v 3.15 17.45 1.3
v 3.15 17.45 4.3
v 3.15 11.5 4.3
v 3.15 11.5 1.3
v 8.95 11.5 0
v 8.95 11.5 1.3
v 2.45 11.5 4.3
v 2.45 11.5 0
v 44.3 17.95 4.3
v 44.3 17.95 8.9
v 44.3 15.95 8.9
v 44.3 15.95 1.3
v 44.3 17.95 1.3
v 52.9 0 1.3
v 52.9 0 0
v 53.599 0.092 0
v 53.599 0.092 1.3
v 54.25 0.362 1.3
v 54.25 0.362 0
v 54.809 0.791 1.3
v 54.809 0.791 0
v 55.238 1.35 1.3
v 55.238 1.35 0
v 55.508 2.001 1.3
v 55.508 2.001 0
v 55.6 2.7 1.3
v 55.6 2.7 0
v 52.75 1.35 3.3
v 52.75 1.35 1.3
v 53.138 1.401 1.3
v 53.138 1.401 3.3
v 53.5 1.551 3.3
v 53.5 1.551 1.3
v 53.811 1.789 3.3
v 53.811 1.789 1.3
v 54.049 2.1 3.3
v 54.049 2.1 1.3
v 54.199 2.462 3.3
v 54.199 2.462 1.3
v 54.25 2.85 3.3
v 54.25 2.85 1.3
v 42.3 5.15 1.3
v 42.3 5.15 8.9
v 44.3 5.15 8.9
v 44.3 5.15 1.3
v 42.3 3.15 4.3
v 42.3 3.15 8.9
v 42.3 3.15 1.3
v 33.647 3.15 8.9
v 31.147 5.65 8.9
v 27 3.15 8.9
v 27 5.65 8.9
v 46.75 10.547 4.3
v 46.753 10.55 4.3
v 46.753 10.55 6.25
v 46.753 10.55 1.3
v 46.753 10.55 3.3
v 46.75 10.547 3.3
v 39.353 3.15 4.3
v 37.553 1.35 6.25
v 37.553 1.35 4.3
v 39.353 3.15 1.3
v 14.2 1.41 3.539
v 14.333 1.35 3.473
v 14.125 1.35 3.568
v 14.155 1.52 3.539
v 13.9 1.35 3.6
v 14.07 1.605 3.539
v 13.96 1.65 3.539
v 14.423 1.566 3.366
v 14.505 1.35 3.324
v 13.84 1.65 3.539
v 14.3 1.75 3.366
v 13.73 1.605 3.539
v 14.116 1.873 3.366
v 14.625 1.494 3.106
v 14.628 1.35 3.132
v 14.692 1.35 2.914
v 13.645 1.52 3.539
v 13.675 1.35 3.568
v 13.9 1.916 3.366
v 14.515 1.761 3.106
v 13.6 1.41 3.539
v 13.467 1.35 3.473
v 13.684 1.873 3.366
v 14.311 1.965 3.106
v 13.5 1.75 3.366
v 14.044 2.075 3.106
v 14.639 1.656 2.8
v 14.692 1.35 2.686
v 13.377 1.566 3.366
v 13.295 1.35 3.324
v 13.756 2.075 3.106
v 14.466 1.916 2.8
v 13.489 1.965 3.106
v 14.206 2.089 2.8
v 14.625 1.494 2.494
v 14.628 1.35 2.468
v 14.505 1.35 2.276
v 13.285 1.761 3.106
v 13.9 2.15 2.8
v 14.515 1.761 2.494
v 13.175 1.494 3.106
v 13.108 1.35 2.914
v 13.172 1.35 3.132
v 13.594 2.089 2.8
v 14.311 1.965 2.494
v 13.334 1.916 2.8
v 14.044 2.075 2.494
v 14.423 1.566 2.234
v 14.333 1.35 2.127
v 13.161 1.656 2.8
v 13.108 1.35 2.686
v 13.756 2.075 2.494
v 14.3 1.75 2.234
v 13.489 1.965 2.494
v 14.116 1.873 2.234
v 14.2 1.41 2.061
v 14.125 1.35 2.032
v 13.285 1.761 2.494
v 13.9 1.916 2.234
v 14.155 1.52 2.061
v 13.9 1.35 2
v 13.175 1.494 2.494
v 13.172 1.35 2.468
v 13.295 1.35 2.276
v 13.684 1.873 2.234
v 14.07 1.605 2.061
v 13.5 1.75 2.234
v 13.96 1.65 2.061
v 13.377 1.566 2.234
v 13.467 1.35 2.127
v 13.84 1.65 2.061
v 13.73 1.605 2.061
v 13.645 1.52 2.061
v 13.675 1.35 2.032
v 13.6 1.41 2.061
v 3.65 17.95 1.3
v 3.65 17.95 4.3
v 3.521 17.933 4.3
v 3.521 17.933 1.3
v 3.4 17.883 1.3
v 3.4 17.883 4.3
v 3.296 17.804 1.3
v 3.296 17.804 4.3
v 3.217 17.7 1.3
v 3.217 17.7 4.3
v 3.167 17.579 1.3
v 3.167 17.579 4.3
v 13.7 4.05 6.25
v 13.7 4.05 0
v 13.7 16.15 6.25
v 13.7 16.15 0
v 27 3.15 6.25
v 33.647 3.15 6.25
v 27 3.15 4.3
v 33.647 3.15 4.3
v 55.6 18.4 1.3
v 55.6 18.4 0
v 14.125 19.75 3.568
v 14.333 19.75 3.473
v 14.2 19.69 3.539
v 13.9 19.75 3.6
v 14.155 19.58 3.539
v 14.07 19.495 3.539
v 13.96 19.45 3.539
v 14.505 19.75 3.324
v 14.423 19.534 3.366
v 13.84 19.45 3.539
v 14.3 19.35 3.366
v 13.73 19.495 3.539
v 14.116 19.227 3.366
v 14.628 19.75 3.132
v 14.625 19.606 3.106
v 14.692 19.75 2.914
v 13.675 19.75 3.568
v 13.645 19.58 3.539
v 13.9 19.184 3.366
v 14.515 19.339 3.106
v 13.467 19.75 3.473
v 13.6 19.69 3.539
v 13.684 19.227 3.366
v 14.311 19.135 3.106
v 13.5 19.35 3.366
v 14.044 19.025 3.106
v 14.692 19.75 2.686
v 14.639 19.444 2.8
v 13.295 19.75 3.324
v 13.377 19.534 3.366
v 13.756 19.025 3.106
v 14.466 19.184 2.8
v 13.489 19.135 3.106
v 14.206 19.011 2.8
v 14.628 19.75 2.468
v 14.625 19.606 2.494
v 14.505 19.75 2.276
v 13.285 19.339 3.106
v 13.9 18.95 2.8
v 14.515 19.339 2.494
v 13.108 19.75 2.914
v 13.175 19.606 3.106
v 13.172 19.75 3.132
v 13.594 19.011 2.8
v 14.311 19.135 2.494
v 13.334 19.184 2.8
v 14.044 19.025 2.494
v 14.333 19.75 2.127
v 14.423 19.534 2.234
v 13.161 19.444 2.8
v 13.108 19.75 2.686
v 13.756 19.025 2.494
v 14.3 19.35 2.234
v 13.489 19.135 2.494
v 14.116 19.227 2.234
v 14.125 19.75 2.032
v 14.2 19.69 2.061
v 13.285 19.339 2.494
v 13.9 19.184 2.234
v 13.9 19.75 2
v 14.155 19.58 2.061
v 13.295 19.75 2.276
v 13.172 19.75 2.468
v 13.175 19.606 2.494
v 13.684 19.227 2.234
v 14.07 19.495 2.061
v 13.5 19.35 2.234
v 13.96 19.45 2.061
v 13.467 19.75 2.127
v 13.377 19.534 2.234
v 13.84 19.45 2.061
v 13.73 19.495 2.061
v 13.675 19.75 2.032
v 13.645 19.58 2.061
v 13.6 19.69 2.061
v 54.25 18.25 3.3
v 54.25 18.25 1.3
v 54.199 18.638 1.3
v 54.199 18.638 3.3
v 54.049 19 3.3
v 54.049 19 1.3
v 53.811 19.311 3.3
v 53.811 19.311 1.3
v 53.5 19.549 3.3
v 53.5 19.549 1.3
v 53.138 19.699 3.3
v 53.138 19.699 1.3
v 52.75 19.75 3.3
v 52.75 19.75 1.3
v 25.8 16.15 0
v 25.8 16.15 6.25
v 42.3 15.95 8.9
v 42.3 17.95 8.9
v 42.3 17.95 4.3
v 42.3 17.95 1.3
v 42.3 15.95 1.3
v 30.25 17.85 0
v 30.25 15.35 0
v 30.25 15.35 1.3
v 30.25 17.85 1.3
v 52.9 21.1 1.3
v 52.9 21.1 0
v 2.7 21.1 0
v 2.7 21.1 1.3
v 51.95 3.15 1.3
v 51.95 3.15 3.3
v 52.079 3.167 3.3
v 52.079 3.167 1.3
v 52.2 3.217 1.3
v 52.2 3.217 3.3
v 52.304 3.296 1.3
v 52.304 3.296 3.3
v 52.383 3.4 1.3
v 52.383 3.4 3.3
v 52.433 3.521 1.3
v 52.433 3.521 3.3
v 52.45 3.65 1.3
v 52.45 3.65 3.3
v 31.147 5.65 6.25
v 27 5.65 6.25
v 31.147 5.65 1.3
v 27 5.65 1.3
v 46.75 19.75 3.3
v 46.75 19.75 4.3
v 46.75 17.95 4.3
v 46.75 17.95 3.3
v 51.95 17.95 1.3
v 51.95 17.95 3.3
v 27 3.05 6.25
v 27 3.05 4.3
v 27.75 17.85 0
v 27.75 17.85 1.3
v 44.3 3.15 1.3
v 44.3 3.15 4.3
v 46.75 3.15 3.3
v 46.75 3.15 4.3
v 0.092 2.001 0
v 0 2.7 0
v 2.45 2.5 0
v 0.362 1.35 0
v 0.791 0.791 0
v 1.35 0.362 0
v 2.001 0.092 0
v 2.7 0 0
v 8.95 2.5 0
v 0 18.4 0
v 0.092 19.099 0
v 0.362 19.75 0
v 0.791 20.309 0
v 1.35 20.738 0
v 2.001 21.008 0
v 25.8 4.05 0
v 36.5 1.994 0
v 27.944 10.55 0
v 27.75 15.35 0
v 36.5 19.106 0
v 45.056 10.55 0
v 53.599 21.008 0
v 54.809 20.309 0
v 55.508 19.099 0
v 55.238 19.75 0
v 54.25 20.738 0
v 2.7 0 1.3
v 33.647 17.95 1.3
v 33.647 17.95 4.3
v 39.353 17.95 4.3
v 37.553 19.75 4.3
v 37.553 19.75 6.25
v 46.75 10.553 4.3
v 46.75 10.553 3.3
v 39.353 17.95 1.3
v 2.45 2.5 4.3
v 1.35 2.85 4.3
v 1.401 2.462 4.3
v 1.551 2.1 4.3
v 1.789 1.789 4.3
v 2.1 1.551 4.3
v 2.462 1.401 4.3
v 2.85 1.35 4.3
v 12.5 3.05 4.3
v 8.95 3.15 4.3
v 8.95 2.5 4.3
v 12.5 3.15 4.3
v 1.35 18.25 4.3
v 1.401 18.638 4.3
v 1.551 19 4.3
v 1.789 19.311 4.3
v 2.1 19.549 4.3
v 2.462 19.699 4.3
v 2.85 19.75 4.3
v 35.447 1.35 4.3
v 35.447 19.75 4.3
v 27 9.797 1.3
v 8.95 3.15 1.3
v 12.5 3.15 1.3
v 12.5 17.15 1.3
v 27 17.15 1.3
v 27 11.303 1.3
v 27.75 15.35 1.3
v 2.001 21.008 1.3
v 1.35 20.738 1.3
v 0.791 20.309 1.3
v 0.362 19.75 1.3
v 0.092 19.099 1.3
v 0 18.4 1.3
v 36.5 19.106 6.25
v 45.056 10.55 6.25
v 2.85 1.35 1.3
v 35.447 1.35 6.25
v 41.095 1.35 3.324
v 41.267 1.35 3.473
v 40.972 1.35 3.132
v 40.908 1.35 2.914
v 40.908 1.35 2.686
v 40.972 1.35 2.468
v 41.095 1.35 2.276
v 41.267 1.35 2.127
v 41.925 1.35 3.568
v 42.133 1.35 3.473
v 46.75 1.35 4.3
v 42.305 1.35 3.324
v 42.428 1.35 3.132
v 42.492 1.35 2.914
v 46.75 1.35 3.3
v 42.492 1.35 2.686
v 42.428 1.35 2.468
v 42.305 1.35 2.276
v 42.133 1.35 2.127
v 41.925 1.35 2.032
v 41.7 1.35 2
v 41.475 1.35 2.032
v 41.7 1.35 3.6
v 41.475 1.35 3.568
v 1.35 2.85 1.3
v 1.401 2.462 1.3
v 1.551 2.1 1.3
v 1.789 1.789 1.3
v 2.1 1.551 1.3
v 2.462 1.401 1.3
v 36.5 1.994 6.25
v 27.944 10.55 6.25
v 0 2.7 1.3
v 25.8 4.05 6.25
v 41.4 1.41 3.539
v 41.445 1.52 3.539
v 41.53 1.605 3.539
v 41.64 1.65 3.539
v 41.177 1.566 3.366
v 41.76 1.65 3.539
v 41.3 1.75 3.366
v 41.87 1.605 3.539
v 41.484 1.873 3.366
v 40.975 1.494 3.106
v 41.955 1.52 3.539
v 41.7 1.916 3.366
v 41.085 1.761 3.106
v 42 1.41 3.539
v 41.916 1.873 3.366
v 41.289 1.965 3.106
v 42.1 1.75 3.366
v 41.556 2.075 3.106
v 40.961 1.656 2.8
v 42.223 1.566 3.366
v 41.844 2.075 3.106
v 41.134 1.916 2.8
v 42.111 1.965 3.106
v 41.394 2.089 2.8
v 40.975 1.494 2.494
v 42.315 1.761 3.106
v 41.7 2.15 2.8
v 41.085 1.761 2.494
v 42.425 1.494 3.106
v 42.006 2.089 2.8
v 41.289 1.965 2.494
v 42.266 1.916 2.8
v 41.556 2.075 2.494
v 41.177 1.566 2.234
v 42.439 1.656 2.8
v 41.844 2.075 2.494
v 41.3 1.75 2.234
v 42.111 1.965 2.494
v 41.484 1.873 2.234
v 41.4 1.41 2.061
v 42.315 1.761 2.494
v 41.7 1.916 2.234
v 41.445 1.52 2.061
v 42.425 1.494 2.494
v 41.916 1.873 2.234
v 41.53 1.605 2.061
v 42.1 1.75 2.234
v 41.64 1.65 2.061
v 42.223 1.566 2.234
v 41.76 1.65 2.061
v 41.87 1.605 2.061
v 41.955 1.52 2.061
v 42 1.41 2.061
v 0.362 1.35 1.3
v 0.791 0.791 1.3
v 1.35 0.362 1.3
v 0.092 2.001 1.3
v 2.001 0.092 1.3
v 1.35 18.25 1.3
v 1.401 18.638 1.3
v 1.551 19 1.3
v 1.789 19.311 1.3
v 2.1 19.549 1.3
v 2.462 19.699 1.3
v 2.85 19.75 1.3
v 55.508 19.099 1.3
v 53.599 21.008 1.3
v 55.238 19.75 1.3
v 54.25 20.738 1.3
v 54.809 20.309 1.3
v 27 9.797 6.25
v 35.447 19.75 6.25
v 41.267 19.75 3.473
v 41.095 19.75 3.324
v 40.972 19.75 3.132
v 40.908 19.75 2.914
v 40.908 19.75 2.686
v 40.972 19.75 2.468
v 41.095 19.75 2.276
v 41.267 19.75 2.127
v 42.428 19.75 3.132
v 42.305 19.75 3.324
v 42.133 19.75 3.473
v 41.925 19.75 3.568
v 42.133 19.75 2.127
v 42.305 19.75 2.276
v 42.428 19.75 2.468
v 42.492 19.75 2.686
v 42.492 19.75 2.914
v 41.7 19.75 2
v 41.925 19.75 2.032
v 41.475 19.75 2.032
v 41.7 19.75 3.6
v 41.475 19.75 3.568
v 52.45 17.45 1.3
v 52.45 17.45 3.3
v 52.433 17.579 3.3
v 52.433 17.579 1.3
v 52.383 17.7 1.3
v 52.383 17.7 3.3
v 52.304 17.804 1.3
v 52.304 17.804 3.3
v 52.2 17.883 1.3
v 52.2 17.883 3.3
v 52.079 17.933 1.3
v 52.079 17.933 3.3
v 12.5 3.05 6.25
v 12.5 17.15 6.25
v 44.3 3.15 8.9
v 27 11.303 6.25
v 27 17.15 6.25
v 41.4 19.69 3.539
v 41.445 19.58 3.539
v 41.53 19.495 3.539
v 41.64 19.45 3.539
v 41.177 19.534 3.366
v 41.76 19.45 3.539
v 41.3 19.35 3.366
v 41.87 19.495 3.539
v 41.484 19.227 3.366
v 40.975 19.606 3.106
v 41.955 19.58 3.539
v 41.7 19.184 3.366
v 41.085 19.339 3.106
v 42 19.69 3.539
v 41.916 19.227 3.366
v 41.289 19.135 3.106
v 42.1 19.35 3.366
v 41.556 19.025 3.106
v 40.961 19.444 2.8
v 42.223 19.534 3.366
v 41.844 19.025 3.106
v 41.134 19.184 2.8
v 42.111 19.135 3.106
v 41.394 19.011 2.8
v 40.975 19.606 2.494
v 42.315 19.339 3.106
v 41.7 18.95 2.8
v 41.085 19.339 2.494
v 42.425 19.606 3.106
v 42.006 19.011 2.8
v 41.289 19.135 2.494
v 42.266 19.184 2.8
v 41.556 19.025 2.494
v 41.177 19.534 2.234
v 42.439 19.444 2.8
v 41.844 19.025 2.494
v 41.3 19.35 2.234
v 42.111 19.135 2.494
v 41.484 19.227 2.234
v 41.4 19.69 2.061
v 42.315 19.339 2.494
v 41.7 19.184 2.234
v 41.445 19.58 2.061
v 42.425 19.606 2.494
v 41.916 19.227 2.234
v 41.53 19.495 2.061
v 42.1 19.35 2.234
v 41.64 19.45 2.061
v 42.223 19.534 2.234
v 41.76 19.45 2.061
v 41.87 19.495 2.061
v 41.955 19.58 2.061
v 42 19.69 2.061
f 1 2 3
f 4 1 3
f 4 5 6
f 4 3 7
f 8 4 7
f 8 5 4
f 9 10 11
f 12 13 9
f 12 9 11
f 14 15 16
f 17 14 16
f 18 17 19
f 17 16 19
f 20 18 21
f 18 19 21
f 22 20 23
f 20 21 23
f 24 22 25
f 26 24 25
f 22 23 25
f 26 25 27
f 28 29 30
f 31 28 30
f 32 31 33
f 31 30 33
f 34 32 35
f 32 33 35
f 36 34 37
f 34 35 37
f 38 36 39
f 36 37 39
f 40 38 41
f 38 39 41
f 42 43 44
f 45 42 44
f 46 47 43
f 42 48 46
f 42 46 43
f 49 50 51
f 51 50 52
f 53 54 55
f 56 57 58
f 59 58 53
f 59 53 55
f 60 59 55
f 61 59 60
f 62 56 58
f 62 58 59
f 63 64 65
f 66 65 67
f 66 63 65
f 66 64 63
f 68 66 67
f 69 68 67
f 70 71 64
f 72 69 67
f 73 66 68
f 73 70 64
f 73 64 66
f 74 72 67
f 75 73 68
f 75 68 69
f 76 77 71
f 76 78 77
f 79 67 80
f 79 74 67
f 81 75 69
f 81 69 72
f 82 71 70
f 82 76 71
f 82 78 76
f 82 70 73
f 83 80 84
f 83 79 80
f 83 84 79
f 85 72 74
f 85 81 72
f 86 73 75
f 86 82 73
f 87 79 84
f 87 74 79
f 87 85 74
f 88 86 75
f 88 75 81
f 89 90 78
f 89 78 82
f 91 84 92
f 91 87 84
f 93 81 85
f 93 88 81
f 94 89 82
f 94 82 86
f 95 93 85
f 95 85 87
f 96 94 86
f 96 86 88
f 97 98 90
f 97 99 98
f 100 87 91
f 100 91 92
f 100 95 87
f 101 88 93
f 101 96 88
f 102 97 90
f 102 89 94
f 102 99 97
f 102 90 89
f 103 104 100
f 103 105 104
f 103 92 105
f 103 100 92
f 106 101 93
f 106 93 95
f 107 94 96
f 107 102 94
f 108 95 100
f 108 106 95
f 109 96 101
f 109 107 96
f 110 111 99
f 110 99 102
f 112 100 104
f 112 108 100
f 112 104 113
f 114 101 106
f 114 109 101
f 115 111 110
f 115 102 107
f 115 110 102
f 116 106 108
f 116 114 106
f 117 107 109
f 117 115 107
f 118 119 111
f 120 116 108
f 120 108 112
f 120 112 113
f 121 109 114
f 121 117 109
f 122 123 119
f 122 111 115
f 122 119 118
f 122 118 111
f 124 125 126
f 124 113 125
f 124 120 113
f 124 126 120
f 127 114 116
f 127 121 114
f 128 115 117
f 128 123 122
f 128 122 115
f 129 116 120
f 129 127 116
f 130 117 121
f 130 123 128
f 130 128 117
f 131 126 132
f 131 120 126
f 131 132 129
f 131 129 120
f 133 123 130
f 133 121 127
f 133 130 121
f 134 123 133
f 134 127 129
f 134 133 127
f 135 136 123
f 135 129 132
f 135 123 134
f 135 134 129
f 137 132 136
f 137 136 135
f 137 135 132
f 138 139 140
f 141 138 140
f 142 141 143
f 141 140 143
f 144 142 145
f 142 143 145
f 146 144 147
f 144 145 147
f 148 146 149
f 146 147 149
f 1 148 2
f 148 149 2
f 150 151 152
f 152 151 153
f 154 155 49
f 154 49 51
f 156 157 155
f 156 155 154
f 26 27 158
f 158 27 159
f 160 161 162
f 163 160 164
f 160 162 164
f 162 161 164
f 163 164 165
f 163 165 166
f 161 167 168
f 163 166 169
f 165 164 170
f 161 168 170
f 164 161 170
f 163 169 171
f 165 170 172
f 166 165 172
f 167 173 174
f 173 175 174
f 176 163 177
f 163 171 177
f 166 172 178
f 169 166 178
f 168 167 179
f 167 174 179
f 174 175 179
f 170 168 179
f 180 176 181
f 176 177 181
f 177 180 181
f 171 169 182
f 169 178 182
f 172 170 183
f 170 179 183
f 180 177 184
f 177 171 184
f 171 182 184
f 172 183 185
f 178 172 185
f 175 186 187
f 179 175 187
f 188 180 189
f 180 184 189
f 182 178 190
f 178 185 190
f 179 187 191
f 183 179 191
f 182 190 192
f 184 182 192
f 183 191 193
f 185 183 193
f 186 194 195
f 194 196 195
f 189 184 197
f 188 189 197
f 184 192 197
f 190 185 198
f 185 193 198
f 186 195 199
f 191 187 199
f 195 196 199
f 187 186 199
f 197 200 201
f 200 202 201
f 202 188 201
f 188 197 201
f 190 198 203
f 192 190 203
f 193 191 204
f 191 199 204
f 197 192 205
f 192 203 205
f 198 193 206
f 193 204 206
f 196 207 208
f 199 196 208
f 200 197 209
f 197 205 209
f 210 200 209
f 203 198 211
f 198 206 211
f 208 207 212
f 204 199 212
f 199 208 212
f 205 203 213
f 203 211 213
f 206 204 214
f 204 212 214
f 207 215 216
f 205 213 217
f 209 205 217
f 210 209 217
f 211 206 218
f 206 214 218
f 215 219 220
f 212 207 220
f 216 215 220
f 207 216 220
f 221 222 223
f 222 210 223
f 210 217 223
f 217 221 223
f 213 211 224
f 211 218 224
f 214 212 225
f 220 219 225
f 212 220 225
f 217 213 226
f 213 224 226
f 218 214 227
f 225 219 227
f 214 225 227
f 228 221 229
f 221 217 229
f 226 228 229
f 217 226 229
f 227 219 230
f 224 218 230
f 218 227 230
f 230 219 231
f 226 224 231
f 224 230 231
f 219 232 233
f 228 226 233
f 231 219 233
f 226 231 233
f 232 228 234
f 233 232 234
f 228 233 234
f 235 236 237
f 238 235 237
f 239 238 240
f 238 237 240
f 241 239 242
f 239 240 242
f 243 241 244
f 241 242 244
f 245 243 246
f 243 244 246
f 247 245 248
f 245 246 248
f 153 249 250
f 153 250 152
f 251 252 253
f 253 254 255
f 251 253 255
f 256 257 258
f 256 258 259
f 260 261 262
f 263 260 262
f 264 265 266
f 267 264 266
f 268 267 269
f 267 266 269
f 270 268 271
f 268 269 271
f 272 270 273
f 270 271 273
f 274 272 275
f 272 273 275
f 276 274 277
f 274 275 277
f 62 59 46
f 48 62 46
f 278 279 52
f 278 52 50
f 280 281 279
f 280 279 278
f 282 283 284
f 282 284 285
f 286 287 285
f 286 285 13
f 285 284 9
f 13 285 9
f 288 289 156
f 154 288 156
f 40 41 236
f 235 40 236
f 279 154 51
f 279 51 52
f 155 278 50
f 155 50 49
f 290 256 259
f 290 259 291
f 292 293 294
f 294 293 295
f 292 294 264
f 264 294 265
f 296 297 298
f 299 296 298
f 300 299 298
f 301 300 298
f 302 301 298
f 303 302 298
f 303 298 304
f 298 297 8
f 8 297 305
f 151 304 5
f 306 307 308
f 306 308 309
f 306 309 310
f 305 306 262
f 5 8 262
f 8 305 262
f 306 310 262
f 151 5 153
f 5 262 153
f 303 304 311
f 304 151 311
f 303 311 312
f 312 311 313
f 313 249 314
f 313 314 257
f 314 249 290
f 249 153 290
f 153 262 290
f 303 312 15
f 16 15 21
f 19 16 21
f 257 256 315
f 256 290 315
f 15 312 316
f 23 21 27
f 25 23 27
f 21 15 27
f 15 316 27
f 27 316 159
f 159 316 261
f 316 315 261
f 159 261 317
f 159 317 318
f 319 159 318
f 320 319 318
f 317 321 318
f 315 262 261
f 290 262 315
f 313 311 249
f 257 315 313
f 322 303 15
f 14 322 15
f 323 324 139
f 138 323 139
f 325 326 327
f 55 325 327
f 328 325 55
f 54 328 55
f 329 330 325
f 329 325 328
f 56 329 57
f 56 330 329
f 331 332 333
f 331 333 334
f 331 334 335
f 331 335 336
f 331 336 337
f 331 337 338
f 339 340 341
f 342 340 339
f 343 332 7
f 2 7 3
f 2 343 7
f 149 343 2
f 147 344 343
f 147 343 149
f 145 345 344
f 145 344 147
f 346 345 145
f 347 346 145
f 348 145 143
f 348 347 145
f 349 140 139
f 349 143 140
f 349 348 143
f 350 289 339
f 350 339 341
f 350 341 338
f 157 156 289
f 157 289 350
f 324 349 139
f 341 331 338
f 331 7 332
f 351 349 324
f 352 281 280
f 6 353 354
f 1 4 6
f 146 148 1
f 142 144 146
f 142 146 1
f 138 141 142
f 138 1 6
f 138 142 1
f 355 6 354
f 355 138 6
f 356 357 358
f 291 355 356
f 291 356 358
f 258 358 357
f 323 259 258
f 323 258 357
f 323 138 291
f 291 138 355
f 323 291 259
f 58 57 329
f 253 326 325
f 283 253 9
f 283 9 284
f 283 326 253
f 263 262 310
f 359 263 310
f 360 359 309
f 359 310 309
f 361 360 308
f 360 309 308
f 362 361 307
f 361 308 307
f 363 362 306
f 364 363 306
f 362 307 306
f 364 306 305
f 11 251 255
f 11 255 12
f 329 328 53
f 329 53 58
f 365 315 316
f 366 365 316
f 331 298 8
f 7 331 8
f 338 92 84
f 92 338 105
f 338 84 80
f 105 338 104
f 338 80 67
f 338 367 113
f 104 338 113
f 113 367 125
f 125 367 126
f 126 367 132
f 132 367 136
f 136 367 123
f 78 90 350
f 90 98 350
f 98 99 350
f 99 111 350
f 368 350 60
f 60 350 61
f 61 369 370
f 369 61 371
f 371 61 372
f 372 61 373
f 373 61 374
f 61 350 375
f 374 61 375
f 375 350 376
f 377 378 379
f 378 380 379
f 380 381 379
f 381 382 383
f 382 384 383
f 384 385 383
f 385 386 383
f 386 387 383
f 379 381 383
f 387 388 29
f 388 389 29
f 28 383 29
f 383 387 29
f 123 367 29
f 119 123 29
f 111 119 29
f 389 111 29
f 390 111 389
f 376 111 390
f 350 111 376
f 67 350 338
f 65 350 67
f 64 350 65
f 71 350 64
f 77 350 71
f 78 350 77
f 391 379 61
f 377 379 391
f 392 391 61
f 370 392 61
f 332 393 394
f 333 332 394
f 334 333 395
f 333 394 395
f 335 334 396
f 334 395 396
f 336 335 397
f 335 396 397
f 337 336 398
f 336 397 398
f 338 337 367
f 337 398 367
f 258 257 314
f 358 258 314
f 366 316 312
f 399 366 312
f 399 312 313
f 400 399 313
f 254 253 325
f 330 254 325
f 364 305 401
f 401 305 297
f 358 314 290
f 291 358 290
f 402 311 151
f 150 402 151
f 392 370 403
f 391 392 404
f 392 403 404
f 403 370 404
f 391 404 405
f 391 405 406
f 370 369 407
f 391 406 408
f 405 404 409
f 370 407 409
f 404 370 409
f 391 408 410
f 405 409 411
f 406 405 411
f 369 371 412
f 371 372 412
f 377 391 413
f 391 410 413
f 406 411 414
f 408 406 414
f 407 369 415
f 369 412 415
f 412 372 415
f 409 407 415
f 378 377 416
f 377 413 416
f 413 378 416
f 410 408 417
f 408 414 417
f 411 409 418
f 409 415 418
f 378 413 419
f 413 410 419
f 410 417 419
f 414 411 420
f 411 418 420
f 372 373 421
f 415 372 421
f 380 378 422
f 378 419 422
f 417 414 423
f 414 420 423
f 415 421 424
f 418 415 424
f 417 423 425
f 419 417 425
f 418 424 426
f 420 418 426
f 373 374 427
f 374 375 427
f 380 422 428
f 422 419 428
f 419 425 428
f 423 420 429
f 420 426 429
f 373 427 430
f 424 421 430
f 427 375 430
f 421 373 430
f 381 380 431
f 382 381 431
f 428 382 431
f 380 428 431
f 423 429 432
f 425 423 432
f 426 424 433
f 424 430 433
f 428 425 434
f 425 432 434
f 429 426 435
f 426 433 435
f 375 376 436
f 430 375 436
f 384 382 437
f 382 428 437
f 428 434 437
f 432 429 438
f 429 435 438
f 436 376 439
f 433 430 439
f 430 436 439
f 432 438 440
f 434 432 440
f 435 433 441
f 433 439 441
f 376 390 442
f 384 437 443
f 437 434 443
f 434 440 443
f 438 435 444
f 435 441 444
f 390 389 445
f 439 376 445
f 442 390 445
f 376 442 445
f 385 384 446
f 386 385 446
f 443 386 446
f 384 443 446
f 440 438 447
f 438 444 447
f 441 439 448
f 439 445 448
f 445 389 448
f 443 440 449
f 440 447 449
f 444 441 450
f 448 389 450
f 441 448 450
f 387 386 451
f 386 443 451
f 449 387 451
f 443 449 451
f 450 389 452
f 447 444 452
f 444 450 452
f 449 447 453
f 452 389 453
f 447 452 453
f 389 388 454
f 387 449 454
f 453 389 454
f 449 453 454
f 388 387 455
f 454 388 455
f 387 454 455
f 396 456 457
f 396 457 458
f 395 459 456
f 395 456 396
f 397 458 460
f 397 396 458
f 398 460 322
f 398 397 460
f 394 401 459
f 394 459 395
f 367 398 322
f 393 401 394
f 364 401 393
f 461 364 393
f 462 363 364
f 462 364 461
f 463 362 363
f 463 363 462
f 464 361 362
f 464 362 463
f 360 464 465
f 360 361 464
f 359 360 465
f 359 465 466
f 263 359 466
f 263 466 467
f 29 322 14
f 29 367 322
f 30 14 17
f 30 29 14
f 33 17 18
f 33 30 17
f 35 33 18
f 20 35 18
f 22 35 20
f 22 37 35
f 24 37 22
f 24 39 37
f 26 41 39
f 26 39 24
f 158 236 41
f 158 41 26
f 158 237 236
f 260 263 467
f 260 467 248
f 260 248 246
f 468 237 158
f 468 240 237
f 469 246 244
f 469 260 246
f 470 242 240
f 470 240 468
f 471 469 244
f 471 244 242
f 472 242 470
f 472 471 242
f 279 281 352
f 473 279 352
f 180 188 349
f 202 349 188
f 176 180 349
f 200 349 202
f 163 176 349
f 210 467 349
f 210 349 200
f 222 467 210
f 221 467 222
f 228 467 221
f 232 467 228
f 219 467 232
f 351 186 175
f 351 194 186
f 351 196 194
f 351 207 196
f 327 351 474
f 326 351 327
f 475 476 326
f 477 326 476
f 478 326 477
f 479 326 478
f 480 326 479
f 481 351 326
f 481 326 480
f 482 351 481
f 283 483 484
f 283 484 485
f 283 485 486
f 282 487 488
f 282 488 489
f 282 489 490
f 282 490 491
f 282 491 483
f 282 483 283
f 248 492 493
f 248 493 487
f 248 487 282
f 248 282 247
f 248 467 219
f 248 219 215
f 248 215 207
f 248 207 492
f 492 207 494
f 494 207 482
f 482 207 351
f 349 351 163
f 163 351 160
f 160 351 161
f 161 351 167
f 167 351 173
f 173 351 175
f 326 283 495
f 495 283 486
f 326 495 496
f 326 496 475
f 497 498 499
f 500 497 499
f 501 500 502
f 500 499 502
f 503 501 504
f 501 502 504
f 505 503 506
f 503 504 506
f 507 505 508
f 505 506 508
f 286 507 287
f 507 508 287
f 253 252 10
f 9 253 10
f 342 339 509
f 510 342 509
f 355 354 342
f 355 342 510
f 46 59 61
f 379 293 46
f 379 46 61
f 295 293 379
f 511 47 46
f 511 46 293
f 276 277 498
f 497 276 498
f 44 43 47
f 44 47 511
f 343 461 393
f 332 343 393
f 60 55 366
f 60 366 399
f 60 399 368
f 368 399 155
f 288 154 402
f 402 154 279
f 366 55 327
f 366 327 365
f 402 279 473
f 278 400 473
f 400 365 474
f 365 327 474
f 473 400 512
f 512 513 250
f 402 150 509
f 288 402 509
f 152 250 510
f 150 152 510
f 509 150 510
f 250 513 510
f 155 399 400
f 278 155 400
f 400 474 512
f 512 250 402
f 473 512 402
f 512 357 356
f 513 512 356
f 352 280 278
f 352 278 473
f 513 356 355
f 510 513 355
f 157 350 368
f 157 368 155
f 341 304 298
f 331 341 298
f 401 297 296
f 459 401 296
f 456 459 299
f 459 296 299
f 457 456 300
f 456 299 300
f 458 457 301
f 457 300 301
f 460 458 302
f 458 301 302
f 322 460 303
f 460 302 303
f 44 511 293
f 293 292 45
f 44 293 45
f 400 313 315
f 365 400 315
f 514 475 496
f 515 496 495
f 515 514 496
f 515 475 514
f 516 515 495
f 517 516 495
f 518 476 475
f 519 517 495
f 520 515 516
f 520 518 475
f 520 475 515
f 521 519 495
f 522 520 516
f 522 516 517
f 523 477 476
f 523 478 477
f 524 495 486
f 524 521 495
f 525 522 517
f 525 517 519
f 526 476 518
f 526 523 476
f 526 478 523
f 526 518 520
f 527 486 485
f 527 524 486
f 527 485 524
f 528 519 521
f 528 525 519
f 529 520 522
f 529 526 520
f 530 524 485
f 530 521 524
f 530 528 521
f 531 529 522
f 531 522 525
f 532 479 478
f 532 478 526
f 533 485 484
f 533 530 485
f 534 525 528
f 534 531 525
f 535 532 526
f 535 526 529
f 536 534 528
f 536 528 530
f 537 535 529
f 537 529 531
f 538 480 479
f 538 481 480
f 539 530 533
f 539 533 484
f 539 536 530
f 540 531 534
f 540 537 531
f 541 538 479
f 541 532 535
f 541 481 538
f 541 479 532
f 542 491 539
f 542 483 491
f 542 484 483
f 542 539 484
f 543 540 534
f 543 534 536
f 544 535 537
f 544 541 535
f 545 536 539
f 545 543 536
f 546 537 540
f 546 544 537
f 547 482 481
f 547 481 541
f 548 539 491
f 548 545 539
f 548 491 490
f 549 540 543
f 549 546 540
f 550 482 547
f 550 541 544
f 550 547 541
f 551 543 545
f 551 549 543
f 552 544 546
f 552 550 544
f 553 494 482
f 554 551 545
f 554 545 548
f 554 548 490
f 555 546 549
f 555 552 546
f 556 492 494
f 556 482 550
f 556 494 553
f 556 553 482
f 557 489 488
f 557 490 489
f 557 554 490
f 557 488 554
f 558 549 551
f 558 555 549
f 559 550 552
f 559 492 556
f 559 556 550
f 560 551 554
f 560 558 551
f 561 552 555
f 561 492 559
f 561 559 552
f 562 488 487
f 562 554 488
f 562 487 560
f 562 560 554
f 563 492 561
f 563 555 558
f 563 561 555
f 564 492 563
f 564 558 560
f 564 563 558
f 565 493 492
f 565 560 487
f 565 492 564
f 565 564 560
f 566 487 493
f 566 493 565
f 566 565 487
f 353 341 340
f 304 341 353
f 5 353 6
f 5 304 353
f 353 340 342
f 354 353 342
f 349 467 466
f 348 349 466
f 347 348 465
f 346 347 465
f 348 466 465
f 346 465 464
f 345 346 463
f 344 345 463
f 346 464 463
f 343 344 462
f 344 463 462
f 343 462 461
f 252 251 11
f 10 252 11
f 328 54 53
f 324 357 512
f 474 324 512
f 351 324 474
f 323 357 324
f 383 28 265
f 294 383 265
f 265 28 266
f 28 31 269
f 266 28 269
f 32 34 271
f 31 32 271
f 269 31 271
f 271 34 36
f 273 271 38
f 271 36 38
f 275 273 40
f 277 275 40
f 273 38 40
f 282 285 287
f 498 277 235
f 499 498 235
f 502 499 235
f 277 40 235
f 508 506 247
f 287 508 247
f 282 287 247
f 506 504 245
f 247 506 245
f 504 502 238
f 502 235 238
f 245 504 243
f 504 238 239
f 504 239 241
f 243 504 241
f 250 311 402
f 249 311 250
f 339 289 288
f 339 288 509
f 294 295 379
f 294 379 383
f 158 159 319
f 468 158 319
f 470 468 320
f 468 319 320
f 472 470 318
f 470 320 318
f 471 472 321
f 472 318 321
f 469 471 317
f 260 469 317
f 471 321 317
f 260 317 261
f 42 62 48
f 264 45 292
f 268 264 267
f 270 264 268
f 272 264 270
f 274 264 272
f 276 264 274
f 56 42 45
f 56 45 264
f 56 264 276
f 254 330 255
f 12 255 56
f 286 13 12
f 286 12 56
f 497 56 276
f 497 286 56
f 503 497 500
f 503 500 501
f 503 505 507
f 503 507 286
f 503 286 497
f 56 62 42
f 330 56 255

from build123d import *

# Parameters (mm, degrees)
BOSS_EXTRUDE1_DEPTH = 1.3
BOSS_EXTRUDE3_DEPTH = 3
CUT_EXTRUDE1_DEPTH  = 3
SKETCH11_W          = 6.5
SKETCH11_H          = 9
CUT_EXTRUDE2_DEPTH  = 4.3
SKETCH12_W          = 12.1
SKETCH12_H          = 12.1
CUT_EXTRUDE4_DEPTH  = 1.3
SKETCH17_W          = 14.5
SKETCH17_H          = 14.1
SKETCH17_W_2        = 12.1
SKETCH17_H_2        = 12.1
BOSS_EXTRUDE4_DEPTH = 6.25
CUT_EXTRUDE5_DEPTH  = 4.3
BOSS_EXTRUDE5_DEPTH = 6.25
CUT_EXTRUDE6_START  = -3
CUT_EXTRUDE6_DEPTH  = 23
SKETCH21_W          = 2.5
SKETCH21_H          = 2.5
CUT_EXTRUDE7_DEPTH  = 10
BOSS_EXTRUDE7_DEPTH = 7.6
SKETCH25_W          = 2
SKETCH25_H          = 2
BOSS_EXTRUDE8_DEPTH = 7.6
SKETCH27_W          = 1
SKETCH27_H          = 18.4
CUT_EXTRUDE8_DEPTH  = 7.5


with BuildPart() as part:
    # Sketch1 → Boss-Extrude1 (new body)
    with BuildSketch(Plane.XY):
        with BuildLine():
            Line((2.7, 0), (52.9, 0))
            ThreePointArc((52.9, 0), (54.809188309, 0.790811691), (55.6, 2.7))
            Line((55.6, 2.7), (55.6, 18.4))
            ThreePointArc((55.6, 18.4), (54.809188309, 20.309188309), (52.9, 21.1))
            Line((52.9, 21.1), (2.7, 21.1))
            ThreePointArc((2.7, 21.1), (0.790811691, 20.309188309), (0, 18.4))
            Line((0, 18.4), (0, 2.7))
            ThreePointArc((0, 2.7), (0.790811691, 0.790811691), (2.7, 0))
        make_face()
    extrude(amount=BOSS_EXTRUDE1_DEPTH)

    # Sketch4 → Boss-Extrude3 (add)
    with BuildSketch(Plane.XY.offset(1.3)):
        with BuildLine():
            Line((54.25, 2.85), (54.25, 18.25))
            ThreePointArc((54.25, 18.25), (53.810660172, 19.310660172), (52.75, 19.75))
            Line((52.75, 19.75), (2.85, 19.75))
            ThreePointArc((2.85, 19.75), (1.789339828, 19.310660172), (1.35, 18.25))
            Line((1.35, 18.25), (1.35, 2.85))
            ThreePointArc((1.35, 2.85), (1.789339828, 1.789339828), (2.85, 1.35))
            Line((2.85, 1.35), (52.75, 1.35))
            ThreePointArc((52.75, 1.35), (53.810660172, 1.789339828), (54.25, 2.85))
        make_face()
    extrude(amount=BOSS_EXTRUDE3_DEPTH)

    # Sketch5 → Cut-Extrude1 (cut)
    with BuildSketch(Plane.XY.offset(4.3)):
        with BuildLine():
            Line((51.95, 17.95), (3.65, 17.95))
            ThreePointArc((3.65, 17.95), (3.296446609, 17.803553391), (3.15, 17.45))
            Line((3.15, 17.45), (3.15, 3.65))
            ThreePointArc((3.15, 3.65), (3.296446609, 3.296446609), (3.65, 3.15))
            Line((3.65, 3.15), (51.95, 3.15))
            ThreePointArc((51.95, 3.15), (52.303553391, 3.296446609), (52.45, 3.65))
            Line((52.45, 3.65), (52.45, 17.45))
            ThreePointArc((52.45, 17.45), (52.303553391, 17.803553391), (51.95, 17.95))
        make_face()
    extrude(amount=-CUT_EXTRUDE1_DEPTH, mode=Mode.SUBTRACT)

    # Sketch10 → Cut-Revolve1 (revolve, cut)
    with BuildSketch(Plane(origin=(0, 19.75, 0), x_dir=(1, 0, 0), z_dir=(0, 1, 0))):
        with BuildLine():
            Line((41.7, -2), (41.7, -3.6))
            ThreePointArc((41.7, -3.6), (40.9, -2.8), (41.7, -2))
        make_face()
    cut_revolve1 = revolve(axis=Axis((41.7, 19.75, 2), (0, 0, 1)), mode=Mode.SUBTRACT)

    # Mirror1: Cut-Revolve1 across plane
    add(cut_revolve1.mirror(Plane(origin=(0, 10.55, 0), x_dir=(0, 0, 1), z_dir=(0, -1, 0))), mode=Mode.SUBTRACT)

    # Sketch11 → Cut-Extrude2 (cut)
    with BuildSketch(Plane(origin=(0, 0, 0), x_dir=(-1, 0, 0), z_dir=(0, 0, -1))):
        with Locations((-5.7, 7)):
            Rectangle(SKETCH11_W, SKETCH11_H)
    extrude(amount=-CUT_EXTRUDE2_DEPTH, mode=Mode.SUBTRACT)

    # Sketch12 → Cut-Extrude4 (cut)
    with BuildSketch(Plane(origin=(0, 0, 0), x_dir=(-1, 0, 0), z_dir=(0, 0, -1))):
        with Locations((-19.75, 10.1)):
            Rectangle(SKETCH12_W, SKETCH12_H)
    extrude(amount=-CUT_EXTRUDE4_DEPTH, mode=Mode.SUBTRACT)

    # Sketch17 → Boss-Extrude4 (add)
    with BuildSketch(Plane(origin=(0, 0, 0), x_dir=(-1, 0, 0), z_dir=(0, 0, -1))):
        with Locations((-19.75, 10.1)):
            Rectangle(SKETCH17_W, SKETCH17_H)
        with Locations((-19.75, 10.1)):
            Rectangle(SKETCH17_W_2, SKETCH17_H_2, mode=Mode.SUBTRACT)
    extrude(amount=-BOSS_EXTRUDE4_DEPTH)

    # Sketch13 → Cut-Extrude5 (cut)
    with BuildSketch(Plane(origin=(0, 0, 0), x_dir=(-1, 0, 0), z_dir=(0, 0, -1))):
        Polygon((-45.055992052, 10.55), (-36.5, 1.994007948), (-27.944007948, 10.55), (-36.5, 19.105992052), align=None)
    extrude(amount=-CUT_EXTRUDE5_DEPTH, mode=Mode.SUBTRACT)

    # Sketch18 → Boss-Extrude5 (add)
    with BuildSketch(Plane(origin=(0, 0, 0), x_dir=(-1, 0, 0), z_dir=(0, 0, -1))):
        Polygon((-46.753048327, 10.55), (-36.5, 0.296951673), (-26.246951673, 10.55), (-36.5, 20.803048327), align=None)
        Polygon((-36.5, 19.105992052), (-45.055992052, 10.55), (-36.5, 1.994007948), (-27.944007948, 10.55), align=None, mode=Mode.SUBTRACT)
    extrude(amount=-BOSS_EXTRUDE5_DEPTH)

    # Sketch20 → Cut-Extrude6 (cut)
    with BuildSketch(Plane.XY.offset(4.3).offset(CUT_EXTRUDE6_START)):
        Polygon((35.446951673, 19.75), (37.553048327, 19.75), (36.5, 20.803048327), align=None)
    cut_extrude6 = extrude(amount=CUT_EXTRUDE6_DEPTH, mode=Mode.SUBTRACT)

    # Mirror2: Cut-Extrude6 across plane
    add(cut_extrude6.mirror(Plane(origin=(0, 10.55, 0), x_dir=(0, 0, 1), z_dir=(0, -1, 0))), mode=Mode.SUBTRACT)

    # Sketch21 → Cut-Extrude7 (cut)
    with BuildSketch(Plane(origin=(0, 0, 0), x_dir=(-1, 0, 0), z_dir=(0, 0, -1))):
        with Locations((-29, 16.6)):
            Rectangle(SKETCH21_W, SKETCH21_H)
    extrude(amount=-CUT_EXTRUDE7_DEPTH, mode=Mode.SUBTRACT)

    # Mirror3: Cut-Revolve1 across plane
    add(cut_revolve1.mirror(Plane.ZY.offset(-27.8)), mode=Mode.SUBTRACT)

    # Mirror3 copy 1 sketch → Mirror3 copy 1 (revolve, cut)
    with BuildSketch(Plane(origin=(55.6, 1.35, 0), x_dir=(-1, 0, 0), z_dir=(0, -1, 0))):
        with BuildLine():
            Line((41.7, -2), (41.7, -3.6))
            ThreePointArc((41.7, -3.6), (40.9, -2.8), (41.7, -2))
        make_face()
    revolve(axis=Axis((13.9, 1.35, 2), (0, 0, 1)), mode=Mode.SUBTRACT)

    # Sketch24 → Boss-Extrude7 (add)
    with BuildSketch(Plane.XY.offset(1.3)):
        Polygon((33.646951673, 3.15), (27, 3.15), (27, 5.65), (31.146951673, 5.65), align=None)
    extrude(amount=BOSS_EXTRUDE7_DEPTH)

    # Sketch25 → Boss-Extrude8 (add)
    with BuildSketch(Plane.XY.offset(1.3)):
        with Locations((43.3, 4.15)):
            Rectangle(SKETCH25_W, SKETCH25_H)
    boss_extrude8 = extrude(amount=BOSS_EXTRUDE8_DEPTH)

    # Mirror4: Boss-Extrude8 across plane
    add(boss_extrude8.mirror(Plane(origin=(0, 10.55, 0), x_dir=(0, 0, 1), z_dir=(0, -1, 0))))

    # Sketch27 → Cut-Extrude8 (cut)
    with BuildSketch(Plane(origin=(54.25, 0, 0), x_dir=(0, 0, -1), z_dir=(1, 0, 0))):
        with Locations((-3.8, 10.55)):
            Rectangle(SKETCH27_W, SKETCH27_H)
    extrude(amount=-CUT_EXTRUDE8_DEPTH, mode=Mode.SUBTRACT)


solid = part.part
